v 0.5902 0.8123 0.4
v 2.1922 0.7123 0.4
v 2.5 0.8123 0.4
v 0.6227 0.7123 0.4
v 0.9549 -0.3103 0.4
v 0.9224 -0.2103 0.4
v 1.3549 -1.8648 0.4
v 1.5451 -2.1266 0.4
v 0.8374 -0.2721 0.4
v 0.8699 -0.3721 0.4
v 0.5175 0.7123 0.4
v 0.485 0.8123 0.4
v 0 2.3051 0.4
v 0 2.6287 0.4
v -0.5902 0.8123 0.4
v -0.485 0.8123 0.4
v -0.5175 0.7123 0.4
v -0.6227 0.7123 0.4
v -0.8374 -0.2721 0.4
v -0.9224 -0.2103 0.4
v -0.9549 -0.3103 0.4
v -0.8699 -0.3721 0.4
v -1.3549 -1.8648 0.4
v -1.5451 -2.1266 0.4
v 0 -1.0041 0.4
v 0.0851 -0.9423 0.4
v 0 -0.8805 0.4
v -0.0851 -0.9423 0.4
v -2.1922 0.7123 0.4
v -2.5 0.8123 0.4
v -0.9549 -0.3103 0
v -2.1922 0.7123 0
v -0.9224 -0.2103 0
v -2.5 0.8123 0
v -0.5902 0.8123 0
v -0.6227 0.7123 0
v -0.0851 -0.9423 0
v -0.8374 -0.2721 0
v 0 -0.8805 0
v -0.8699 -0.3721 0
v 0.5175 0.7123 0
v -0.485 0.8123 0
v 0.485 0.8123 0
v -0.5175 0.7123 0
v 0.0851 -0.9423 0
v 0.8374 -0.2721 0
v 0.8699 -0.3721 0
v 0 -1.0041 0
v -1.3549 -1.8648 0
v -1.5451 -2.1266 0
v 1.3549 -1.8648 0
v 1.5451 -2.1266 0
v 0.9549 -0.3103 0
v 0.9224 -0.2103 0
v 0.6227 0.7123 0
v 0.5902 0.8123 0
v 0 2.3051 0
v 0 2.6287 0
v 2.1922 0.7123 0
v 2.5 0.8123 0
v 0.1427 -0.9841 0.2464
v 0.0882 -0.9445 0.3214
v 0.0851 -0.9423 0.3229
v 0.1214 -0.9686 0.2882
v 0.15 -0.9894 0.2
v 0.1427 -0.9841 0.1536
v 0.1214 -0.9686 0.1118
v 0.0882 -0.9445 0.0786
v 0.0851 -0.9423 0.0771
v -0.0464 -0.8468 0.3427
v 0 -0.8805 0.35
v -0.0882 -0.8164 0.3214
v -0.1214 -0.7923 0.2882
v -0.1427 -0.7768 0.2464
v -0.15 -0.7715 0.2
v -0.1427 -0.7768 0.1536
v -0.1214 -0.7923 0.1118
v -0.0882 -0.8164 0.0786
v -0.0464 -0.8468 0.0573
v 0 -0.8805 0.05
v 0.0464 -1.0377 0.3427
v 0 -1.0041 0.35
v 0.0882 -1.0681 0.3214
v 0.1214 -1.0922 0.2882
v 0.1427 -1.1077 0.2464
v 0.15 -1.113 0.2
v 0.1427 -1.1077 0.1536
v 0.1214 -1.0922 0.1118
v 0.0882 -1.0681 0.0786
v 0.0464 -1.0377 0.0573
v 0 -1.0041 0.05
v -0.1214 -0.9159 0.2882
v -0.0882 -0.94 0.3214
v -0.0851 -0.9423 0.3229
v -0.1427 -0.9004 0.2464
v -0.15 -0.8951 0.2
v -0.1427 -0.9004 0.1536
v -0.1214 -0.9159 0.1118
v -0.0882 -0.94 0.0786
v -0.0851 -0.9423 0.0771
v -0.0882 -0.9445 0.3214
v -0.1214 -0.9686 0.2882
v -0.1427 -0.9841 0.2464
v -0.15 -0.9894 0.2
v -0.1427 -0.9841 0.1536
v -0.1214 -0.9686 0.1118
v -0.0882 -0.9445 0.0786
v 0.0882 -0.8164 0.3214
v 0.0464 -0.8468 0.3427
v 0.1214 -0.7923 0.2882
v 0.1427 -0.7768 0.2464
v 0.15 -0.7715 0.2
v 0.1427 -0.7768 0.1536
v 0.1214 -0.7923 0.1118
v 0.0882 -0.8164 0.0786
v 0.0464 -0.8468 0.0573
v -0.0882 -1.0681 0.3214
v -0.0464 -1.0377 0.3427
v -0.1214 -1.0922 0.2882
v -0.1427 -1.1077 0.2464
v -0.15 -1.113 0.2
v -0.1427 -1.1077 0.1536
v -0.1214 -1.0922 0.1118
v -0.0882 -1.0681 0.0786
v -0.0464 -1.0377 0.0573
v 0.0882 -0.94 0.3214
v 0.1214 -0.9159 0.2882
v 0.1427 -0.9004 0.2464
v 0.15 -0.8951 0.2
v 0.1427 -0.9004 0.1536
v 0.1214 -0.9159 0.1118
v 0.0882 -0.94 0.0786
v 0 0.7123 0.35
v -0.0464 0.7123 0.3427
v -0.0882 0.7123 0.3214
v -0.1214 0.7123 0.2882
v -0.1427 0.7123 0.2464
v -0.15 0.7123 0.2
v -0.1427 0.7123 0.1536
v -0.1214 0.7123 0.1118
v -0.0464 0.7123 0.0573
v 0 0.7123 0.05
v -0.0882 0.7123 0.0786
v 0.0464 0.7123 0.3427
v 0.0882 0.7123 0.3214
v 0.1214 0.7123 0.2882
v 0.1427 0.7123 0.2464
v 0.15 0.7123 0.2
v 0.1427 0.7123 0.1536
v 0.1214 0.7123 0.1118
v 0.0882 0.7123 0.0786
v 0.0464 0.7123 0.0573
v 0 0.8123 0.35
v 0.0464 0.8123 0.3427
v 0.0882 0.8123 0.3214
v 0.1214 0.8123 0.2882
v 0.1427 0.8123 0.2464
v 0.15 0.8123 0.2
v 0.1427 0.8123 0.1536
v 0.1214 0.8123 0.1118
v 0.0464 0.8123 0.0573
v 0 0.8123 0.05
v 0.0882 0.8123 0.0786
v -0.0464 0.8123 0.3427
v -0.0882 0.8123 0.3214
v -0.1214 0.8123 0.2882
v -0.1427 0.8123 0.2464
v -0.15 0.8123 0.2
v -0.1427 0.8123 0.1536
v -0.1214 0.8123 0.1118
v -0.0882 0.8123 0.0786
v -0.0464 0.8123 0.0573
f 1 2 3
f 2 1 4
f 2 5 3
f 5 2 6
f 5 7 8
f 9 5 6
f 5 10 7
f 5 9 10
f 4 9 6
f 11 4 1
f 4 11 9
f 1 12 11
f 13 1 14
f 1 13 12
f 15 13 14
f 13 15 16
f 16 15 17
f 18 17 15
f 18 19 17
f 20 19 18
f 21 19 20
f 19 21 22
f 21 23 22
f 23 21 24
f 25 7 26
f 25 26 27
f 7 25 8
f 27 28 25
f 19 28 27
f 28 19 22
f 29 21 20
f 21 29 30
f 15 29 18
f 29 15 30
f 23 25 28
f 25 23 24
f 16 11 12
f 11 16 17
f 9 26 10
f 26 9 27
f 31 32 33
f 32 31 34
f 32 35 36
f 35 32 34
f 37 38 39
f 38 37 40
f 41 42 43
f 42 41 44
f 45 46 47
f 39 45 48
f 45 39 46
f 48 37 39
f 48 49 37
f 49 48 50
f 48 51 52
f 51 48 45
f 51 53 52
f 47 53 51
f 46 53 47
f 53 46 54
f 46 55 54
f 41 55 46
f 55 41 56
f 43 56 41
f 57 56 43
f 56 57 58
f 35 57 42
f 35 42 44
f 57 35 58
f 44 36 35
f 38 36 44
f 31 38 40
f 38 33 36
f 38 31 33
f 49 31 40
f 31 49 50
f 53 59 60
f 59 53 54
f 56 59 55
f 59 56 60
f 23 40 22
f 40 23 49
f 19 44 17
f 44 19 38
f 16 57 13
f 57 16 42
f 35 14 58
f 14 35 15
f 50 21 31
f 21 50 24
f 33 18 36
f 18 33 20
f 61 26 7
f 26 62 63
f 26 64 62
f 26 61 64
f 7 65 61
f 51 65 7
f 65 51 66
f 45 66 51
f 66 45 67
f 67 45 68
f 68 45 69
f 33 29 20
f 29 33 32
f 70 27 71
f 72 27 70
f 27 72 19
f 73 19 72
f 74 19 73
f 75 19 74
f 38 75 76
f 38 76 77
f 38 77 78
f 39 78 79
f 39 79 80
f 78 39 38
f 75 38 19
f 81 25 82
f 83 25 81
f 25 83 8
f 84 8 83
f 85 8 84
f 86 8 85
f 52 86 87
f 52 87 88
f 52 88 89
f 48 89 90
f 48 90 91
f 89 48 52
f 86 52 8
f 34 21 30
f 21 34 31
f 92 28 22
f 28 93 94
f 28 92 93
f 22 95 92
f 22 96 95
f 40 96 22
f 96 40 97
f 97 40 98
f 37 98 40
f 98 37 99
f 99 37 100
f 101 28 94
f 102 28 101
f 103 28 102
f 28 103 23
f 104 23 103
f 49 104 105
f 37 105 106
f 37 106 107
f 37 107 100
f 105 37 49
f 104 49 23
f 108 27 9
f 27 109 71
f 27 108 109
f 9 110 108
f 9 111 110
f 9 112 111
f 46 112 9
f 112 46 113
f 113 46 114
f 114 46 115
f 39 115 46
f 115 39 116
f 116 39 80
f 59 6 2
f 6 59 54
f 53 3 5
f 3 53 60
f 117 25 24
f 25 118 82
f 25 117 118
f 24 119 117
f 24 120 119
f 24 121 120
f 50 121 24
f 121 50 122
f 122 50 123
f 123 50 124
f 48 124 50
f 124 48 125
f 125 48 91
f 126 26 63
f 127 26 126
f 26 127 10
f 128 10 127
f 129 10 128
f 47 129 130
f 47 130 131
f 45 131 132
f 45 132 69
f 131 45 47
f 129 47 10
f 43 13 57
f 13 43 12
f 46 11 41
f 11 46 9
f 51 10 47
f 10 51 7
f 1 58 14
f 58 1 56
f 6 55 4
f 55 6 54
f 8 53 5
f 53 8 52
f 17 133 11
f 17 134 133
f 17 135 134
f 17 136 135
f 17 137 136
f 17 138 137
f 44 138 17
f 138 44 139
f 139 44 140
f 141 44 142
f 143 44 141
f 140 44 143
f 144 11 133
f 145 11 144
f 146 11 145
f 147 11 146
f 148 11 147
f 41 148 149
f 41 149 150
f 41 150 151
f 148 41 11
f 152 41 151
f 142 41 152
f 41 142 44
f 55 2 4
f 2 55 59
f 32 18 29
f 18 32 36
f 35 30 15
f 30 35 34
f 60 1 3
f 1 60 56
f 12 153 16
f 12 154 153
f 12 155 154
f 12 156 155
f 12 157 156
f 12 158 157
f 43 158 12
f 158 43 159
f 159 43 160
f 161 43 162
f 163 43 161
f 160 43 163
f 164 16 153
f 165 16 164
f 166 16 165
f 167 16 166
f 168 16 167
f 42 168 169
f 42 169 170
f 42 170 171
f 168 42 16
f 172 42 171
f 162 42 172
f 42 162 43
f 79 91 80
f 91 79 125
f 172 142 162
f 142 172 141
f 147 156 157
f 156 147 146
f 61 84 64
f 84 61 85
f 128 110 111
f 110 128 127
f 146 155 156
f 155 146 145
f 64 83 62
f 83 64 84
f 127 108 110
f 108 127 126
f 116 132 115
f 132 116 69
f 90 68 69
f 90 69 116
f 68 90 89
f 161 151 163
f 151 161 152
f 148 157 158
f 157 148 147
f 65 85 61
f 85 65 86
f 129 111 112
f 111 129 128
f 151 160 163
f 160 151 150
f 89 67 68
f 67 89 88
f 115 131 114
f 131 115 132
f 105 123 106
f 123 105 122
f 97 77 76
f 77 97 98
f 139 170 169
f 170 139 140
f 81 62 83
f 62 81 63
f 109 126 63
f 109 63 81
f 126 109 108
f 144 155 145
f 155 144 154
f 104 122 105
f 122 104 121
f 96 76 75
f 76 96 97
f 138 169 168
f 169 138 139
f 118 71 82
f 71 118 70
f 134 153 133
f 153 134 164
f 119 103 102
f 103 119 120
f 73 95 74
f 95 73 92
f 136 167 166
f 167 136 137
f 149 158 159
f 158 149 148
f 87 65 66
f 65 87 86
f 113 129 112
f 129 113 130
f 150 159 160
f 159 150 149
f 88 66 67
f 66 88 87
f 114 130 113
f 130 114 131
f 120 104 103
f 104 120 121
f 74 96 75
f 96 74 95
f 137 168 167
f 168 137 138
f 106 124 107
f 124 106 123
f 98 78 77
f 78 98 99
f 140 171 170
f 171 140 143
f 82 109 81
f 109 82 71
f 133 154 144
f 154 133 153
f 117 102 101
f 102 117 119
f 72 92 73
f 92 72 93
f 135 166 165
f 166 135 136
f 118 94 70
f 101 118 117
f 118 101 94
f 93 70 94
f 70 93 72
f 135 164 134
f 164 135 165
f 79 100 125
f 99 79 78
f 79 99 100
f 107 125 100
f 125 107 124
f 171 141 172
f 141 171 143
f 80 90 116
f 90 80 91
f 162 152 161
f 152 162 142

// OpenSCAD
// [FL_INDEX: keywords="openscad, 3d_parametric, Customizable_Pentagram_Yule_Tree_Topper, csg_solid" | COT="Parametric OpenSCAD design from 3DCodeverse"]
// Title: Customizable Pentagram Yule Tree Topper

//Customizable Pentagram Yule Tree Topper
//Created by Ari M. Diacou, January 2014
//Shared under Creative Commons License: Attribution-ShareAlike 3.0 Unported (CC BY-SA 3.0) 
//see http://creativecommons.org/licenses/by-sa/3.0/

// preview[view:south, tilt:top diagonal]
//The length of one of the sides of the star
length=5;
//The thickness of one of the sides of the star
thickness=.1;
//The height of one of the sides of the star
height=.4;
//The diameter of the hole for the tree topper
hole=.3;

/* HIDDEN */
angle=36+0;
phi=(1+sqrt(5))/2;
a=length/(2*phi+1);
r=length*cos(angle)/((4*phi+2)*sin(angle));

module side(){
	mirror([0,1,0]){
		difference(){
			cube([length,thickness,height]);
			rotate([0,0,angle]) 
				cube([thickness/sin(angle),thickness,height]);
			translate([length,0,0]) 	
				mirror([1,0,0]){
					rotate([0,0,angle]) 
						cube([thickness/sin(angle),thickness,height]);
					}
			}
		}
	}

difference(){
	for(i=[1:5]){
	   rotate([0,0,i*2*angle]) 
			translate([-length/2,r,0]) 
				side();
		}
	translate([0,r+thickness/100,height/2])
		rotate([90,0,0])
			cylinder(r=hole/2,h=length, $fn=20);
	}
